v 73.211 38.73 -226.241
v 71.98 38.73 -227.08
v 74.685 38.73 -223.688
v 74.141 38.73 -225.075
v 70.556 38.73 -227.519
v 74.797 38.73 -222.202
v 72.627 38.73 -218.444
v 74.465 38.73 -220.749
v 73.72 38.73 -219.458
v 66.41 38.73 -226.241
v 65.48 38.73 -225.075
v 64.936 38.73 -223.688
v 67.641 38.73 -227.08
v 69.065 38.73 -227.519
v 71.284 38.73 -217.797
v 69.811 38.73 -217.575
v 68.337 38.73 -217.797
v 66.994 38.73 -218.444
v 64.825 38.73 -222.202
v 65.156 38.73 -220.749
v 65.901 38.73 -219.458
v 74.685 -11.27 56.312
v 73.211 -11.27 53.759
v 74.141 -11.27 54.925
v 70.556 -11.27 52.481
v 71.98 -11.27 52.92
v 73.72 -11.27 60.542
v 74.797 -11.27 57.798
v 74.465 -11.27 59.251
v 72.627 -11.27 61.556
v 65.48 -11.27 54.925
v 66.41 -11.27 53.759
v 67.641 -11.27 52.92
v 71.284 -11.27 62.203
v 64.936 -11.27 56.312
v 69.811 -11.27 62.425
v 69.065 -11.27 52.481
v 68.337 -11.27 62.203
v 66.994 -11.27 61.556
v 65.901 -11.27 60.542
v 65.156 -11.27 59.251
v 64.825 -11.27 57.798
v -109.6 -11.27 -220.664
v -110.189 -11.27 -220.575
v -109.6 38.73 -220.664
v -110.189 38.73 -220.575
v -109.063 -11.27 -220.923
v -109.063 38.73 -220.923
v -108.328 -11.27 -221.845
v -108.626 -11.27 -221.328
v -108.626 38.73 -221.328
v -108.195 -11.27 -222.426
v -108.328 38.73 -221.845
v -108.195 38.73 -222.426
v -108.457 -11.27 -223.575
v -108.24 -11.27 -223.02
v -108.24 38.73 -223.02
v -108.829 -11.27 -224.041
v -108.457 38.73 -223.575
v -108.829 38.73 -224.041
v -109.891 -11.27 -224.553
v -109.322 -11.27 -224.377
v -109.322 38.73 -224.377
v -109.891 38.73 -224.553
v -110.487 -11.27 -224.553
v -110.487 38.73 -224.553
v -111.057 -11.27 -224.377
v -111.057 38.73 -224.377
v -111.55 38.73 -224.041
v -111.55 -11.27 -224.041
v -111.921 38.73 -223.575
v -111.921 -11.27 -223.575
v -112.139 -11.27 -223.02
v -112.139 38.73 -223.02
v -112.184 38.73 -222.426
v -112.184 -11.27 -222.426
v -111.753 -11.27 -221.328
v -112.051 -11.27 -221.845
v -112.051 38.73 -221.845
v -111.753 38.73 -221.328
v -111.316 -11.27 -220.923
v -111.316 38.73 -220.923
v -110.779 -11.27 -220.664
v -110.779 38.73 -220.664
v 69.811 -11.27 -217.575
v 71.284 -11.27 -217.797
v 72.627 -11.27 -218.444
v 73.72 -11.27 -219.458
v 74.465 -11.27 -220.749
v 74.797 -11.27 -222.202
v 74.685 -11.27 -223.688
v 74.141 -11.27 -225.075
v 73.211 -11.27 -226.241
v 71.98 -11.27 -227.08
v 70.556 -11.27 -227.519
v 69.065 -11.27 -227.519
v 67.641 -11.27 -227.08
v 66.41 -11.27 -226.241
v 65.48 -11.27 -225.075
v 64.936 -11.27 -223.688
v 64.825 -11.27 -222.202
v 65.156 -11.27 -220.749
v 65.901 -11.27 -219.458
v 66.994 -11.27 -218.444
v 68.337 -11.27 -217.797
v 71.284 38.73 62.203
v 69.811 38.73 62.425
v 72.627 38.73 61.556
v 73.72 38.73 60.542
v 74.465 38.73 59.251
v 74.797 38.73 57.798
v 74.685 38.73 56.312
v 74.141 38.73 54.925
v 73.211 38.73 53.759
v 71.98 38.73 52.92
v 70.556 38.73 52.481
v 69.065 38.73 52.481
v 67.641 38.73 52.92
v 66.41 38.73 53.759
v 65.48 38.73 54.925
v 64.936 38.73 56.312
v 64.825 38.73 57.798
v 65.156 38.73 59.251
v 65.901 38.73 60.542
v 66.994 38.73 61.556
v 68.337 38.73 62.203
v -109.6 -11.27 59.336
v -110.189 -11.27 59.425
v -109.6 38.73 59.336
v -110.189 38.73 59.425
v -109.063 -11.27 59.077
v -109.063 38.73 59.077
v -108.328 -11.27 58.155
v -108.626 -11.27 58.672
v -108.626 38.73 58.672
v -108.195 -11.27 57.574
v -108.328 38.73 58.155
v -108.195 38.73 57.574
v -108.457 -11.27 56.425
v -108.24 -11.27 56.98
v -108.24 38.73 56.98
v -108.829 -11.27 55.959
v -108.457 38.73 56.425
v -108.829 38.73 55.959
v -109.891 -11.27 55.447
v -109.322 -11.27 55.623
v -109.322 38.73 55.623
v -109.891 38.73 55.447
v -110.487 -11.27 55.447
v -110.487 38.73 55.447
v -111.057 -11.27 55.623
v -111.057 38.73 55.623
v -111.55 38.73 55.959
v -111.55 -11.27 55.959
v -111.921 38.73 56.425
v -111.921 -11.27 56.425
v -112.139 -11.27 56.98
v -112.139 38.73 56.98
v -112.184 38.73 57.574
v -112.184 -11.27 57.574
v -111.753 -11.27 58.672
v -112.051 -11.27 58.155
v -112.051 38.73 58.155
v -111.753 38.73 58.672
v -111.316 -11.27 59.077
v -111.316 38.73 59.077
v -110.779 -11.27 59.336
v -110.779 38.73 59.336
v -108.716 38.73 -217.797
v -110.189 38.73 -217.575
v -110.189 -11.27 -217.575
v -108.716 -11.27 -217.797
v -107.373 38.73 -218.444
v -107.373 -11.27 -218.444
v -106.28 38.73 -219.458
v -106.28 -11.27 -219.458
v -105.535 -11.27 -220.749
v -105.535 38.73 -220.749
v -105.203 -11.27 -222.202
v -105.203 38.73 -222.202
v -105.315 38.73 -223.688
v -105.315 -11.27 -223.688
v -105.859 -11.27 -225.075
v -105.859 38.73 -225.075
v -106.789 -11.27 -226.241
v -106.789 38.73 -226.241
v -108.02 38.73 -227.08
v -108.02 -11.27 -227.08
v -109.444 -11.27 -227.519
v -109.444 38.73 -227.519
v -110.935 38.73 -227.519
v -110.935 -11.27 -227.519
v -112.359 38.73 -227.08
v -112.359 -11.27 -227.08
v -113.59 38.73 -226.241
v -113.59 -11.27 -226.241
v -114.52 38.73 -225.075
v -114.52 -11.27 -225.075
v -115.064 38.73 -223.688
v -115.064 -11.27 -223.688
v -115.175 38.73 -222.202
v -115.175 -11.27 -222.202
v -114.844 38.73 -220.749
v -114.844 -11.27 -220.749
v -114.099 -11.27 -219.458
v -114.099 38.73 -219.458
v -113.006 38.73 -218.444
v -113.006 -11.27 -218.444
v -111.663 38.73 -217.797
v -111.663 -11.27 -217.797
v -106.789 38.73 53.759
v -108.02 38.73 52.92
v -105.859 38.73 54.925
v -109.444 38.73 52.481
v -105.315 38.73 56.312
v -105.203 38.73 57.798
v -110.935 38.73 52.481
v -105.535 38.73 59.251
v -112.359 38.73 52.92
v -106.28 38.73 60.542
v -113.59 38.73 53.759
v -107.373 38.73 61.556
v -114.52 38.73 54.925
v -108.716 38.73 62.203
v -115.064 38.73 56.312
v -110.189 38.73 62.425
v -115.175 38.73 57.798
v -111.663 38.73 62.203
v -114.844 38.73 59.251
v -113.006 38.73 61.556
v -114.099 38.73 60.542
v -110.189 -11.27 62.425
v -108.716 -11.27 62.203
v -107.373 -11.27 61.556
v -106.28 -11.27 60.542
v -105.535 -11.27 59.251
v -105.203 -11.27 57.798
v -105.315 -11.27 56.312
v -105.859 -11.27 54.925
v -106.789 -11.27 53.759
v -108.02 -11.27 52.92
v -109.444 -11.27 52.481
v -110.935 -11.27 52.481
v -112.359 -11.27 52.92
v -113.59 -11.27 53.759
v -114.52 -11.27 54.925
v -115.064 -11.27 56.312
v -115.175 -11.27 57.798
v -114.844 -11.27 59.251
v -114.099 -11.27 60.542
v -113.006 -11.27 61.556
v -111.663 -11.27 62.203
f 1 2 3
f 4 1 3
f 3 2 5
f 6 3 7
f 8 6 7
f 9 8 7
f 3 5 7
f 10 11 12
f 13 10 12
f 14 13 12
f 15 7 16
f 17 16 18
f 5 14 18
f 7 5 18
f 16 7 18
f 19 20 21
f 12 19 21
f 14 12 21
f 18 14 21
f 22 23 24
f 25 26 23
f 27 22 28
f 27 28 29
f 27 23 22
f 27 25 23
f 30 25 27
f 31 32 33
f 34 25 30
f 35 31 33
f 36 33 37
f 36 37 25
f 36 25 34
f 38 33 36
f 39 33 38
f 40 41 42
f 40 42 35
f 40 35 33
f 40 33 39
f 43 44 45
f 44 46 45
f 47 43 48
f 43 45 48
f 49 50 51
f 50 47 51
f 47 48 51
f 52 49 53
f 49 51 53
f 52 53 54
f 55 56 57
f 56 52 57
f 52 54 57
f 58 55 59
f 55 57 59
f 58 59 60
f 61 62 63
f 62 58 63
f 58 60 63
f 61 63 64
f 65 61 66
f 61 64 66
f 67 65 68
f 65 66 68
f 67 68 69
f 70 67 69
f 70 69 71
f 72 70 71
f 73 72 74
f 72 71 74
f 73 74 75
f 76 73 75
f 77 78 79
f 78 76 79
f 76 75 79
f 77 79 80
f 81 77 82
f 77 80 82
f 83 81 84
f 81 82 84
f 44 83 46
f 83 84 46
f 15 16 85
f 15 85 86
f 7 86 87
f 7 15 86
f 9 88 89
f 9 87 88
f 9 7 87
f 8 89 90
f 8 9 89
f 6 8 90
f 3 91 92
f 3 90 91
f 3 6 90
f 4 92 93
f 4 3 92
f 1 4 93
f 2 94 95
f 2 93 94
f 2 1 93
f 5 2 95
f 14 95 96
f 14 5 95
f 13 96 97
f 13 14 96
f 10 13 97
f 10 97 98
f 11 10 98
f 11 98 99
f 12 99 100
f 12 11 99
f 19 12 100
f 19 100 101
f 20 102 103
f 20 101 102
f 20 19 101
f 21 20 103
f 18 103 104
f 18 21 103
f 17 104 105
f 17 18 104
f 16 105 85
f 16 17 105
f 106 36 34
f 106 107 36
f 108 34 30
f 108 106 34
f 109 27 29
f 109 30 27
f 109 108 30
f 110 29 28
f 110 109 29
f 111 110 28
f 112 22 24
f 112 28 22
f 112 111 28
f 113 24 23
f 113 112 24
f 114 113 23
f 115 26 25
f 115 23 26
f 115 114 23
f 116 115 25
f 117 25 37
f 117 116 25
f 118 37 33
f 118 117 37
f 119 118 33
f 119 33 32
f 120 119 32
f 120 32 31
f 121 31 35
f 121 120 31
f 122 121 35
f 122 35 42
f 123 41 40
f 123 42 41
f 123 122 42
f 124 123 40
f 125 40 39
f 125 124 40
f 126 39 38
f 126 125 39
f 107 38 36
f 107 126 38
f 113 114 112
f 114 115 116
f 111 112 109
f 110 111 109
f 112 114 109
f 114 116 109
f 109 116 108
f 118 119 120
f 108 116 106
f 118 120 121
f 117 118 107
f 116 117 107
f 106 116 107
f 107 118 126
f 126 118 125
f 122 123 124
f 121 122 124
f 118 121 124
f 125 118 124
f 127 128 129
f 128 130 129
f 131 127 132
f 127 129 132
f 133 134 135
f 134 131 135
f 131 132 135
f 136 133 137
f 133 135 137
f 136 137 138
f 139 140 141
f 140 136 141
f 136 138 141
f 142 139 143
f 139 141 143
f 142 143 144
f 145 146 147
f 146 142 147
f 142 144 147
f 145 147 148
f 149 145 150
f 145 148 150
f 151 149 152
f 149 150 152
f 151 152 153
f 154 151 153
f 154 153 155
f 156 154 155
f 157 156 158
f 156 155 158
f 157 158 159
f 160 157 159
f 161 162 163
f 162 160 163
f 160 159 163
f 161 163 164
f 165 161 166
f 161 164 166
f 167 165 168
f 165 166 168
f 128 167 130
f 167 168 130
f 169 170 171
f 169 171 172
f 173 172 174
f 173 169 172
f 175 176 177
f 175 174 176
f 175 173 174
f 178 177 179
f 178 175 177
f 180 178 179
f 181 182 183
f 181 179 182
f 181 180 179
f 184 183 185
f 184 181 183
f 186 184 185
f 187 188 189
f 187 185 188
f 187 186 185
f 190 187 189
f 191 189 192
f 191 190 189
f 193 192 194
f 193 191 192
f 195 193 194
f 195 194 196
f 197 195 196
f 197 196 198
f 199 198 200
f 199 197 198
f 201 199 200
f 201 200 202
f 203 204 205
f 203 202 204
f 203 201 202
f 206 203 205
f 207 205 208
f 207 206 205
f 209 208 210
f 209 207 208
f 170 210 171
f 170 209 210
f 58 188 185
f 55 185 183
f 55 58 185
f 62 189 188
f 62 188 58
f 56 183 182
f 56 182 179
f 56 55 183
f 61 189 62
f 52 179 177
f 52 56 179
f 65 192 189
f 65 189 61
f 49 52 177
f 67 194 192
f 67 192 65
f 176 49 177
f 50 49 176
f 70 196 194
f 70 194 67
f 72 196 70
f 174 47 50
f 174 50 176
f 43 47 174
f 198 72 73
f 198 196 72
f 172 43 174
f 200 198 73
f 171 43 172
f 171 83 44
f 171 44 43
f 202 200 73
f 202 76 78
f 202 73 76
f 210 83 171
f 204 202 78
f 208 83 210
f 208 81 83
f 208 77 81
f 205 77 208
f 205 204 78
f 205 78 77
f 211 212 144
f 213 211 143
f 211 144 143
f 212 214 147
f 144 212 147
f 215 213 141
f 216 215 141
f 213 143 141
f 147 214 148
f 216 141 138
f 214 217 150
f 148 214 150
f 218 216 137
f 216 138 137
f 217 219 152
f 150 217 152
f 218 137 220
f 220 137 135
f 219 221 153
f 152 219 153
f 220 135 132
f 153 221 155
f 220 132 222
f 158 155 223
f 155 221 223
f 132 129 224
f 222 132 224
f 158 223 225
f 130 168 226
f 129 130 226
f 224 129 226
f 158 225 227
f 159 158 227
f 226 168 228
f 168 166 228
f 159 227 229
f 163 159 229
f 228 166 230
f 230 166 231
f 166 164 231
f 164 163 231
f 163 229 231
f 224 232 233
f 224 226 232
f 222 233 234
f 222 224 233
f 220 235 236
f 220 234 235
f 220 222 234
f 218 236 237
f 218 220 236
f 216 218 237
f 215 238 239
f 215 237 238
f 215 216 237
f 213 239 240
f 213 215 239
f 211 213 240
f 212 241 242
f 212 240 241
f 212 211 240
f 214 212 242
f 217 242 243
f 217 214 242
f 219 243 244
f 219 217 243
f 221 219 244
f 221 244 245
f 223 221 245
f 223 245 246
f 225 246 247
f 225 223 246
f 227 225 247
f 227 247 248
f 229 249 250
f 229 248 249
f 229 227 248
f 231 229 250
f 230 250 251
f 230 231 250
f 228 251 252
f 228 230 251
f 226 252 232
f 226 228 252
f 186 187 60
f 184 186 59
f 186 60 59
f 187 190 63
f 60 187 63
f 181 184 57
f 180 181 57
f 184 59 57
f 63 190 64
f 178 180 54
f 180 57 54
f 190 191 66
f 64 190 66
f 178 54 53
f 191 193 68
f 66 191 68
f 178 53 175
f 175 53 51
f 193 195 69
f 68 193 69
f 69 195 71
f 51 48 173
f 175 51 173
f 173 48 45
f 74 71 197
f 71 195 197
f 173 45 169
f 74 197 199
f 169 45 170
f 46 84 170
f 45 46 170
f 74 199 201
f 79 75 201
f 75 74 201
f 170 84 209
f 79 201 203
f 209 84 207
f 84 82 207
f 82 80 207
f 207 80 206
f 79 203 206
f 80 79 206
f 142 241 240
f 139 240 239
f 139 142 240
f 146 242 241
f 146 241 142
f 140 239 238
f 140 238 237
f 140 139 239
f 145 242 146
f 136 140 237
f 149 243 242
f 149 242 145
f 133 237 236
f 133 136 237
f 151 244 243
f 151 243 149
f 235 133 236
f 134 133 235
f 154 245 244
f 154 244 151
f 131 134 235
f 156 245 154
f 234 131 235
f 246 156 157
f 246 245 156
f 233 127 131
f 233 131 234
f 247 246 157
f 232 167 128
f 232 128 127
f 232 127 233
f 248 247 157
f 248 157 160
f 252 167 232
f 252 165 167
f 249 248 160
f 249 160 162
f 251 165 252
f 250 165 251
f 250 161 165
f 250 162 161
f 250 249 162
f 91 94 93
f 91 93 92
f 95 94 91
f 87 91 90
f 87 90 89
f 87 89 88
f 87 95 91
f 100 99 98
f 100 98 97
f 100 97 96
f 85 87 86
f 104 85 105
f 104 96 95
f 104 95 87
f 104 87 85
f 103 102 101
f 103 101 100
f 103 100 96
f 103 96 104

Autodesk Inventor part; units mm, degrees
ref_plane "YZ Plane" through (0, 0, 0) normal (1, 0, 0) x (0, 1, 0)
ref_plane "XZ Plane" through (0, 0, 0) normal (0, 1, 0) x (-1, 0, 0)
ref_plane "Work Plane2" through (-20.1894, 38.7303, -132.5753) normal (0, -1, 0) x (1, 0, 0)
sketch "Sketch3" plane through (-20.2577, 38.7303, -13.8651) normal (0, -1, 0) x (0, 0, 1)
  circle A0 centre (-118.7102, -0.0683) radius 25 construction
  line L0 (-118.7102, -25.0683) -> (-118.7102, 24.9317) construction
  line L1 (0, 0) -> (-118.7102, -0.0683) construction
  circle A1 centre (71.2898, -90.0683) radius 2 projected
  circle A2 centre (-208.7102, -90.0683) radius 2 projected
  circle A3 centre (-208.7102, 89.9317) radius 2 projected
  circle A4 centre (71.2898, 89.9317) radius 2 projected
  circle A5 centre (71.2898, -90.0683) radius 5
  circle A6 centre (71.2898, 89.9317) radius 5
  circle A7 centre (-208.7102, -90.0683) radius 5
  circle A8 centre (-208.7102, 89.9317) radius 5
  dimension "d1" = 10
  dimension "d2" = 10
  dimension "d3" = 10
  dimension "d4" = 10
extrude "Extrusion1" add sketch "Sketch3" along normal blind 50 contours A1 | A2 | A5 | A6 | A7 | A8
properties part number "Trap"
